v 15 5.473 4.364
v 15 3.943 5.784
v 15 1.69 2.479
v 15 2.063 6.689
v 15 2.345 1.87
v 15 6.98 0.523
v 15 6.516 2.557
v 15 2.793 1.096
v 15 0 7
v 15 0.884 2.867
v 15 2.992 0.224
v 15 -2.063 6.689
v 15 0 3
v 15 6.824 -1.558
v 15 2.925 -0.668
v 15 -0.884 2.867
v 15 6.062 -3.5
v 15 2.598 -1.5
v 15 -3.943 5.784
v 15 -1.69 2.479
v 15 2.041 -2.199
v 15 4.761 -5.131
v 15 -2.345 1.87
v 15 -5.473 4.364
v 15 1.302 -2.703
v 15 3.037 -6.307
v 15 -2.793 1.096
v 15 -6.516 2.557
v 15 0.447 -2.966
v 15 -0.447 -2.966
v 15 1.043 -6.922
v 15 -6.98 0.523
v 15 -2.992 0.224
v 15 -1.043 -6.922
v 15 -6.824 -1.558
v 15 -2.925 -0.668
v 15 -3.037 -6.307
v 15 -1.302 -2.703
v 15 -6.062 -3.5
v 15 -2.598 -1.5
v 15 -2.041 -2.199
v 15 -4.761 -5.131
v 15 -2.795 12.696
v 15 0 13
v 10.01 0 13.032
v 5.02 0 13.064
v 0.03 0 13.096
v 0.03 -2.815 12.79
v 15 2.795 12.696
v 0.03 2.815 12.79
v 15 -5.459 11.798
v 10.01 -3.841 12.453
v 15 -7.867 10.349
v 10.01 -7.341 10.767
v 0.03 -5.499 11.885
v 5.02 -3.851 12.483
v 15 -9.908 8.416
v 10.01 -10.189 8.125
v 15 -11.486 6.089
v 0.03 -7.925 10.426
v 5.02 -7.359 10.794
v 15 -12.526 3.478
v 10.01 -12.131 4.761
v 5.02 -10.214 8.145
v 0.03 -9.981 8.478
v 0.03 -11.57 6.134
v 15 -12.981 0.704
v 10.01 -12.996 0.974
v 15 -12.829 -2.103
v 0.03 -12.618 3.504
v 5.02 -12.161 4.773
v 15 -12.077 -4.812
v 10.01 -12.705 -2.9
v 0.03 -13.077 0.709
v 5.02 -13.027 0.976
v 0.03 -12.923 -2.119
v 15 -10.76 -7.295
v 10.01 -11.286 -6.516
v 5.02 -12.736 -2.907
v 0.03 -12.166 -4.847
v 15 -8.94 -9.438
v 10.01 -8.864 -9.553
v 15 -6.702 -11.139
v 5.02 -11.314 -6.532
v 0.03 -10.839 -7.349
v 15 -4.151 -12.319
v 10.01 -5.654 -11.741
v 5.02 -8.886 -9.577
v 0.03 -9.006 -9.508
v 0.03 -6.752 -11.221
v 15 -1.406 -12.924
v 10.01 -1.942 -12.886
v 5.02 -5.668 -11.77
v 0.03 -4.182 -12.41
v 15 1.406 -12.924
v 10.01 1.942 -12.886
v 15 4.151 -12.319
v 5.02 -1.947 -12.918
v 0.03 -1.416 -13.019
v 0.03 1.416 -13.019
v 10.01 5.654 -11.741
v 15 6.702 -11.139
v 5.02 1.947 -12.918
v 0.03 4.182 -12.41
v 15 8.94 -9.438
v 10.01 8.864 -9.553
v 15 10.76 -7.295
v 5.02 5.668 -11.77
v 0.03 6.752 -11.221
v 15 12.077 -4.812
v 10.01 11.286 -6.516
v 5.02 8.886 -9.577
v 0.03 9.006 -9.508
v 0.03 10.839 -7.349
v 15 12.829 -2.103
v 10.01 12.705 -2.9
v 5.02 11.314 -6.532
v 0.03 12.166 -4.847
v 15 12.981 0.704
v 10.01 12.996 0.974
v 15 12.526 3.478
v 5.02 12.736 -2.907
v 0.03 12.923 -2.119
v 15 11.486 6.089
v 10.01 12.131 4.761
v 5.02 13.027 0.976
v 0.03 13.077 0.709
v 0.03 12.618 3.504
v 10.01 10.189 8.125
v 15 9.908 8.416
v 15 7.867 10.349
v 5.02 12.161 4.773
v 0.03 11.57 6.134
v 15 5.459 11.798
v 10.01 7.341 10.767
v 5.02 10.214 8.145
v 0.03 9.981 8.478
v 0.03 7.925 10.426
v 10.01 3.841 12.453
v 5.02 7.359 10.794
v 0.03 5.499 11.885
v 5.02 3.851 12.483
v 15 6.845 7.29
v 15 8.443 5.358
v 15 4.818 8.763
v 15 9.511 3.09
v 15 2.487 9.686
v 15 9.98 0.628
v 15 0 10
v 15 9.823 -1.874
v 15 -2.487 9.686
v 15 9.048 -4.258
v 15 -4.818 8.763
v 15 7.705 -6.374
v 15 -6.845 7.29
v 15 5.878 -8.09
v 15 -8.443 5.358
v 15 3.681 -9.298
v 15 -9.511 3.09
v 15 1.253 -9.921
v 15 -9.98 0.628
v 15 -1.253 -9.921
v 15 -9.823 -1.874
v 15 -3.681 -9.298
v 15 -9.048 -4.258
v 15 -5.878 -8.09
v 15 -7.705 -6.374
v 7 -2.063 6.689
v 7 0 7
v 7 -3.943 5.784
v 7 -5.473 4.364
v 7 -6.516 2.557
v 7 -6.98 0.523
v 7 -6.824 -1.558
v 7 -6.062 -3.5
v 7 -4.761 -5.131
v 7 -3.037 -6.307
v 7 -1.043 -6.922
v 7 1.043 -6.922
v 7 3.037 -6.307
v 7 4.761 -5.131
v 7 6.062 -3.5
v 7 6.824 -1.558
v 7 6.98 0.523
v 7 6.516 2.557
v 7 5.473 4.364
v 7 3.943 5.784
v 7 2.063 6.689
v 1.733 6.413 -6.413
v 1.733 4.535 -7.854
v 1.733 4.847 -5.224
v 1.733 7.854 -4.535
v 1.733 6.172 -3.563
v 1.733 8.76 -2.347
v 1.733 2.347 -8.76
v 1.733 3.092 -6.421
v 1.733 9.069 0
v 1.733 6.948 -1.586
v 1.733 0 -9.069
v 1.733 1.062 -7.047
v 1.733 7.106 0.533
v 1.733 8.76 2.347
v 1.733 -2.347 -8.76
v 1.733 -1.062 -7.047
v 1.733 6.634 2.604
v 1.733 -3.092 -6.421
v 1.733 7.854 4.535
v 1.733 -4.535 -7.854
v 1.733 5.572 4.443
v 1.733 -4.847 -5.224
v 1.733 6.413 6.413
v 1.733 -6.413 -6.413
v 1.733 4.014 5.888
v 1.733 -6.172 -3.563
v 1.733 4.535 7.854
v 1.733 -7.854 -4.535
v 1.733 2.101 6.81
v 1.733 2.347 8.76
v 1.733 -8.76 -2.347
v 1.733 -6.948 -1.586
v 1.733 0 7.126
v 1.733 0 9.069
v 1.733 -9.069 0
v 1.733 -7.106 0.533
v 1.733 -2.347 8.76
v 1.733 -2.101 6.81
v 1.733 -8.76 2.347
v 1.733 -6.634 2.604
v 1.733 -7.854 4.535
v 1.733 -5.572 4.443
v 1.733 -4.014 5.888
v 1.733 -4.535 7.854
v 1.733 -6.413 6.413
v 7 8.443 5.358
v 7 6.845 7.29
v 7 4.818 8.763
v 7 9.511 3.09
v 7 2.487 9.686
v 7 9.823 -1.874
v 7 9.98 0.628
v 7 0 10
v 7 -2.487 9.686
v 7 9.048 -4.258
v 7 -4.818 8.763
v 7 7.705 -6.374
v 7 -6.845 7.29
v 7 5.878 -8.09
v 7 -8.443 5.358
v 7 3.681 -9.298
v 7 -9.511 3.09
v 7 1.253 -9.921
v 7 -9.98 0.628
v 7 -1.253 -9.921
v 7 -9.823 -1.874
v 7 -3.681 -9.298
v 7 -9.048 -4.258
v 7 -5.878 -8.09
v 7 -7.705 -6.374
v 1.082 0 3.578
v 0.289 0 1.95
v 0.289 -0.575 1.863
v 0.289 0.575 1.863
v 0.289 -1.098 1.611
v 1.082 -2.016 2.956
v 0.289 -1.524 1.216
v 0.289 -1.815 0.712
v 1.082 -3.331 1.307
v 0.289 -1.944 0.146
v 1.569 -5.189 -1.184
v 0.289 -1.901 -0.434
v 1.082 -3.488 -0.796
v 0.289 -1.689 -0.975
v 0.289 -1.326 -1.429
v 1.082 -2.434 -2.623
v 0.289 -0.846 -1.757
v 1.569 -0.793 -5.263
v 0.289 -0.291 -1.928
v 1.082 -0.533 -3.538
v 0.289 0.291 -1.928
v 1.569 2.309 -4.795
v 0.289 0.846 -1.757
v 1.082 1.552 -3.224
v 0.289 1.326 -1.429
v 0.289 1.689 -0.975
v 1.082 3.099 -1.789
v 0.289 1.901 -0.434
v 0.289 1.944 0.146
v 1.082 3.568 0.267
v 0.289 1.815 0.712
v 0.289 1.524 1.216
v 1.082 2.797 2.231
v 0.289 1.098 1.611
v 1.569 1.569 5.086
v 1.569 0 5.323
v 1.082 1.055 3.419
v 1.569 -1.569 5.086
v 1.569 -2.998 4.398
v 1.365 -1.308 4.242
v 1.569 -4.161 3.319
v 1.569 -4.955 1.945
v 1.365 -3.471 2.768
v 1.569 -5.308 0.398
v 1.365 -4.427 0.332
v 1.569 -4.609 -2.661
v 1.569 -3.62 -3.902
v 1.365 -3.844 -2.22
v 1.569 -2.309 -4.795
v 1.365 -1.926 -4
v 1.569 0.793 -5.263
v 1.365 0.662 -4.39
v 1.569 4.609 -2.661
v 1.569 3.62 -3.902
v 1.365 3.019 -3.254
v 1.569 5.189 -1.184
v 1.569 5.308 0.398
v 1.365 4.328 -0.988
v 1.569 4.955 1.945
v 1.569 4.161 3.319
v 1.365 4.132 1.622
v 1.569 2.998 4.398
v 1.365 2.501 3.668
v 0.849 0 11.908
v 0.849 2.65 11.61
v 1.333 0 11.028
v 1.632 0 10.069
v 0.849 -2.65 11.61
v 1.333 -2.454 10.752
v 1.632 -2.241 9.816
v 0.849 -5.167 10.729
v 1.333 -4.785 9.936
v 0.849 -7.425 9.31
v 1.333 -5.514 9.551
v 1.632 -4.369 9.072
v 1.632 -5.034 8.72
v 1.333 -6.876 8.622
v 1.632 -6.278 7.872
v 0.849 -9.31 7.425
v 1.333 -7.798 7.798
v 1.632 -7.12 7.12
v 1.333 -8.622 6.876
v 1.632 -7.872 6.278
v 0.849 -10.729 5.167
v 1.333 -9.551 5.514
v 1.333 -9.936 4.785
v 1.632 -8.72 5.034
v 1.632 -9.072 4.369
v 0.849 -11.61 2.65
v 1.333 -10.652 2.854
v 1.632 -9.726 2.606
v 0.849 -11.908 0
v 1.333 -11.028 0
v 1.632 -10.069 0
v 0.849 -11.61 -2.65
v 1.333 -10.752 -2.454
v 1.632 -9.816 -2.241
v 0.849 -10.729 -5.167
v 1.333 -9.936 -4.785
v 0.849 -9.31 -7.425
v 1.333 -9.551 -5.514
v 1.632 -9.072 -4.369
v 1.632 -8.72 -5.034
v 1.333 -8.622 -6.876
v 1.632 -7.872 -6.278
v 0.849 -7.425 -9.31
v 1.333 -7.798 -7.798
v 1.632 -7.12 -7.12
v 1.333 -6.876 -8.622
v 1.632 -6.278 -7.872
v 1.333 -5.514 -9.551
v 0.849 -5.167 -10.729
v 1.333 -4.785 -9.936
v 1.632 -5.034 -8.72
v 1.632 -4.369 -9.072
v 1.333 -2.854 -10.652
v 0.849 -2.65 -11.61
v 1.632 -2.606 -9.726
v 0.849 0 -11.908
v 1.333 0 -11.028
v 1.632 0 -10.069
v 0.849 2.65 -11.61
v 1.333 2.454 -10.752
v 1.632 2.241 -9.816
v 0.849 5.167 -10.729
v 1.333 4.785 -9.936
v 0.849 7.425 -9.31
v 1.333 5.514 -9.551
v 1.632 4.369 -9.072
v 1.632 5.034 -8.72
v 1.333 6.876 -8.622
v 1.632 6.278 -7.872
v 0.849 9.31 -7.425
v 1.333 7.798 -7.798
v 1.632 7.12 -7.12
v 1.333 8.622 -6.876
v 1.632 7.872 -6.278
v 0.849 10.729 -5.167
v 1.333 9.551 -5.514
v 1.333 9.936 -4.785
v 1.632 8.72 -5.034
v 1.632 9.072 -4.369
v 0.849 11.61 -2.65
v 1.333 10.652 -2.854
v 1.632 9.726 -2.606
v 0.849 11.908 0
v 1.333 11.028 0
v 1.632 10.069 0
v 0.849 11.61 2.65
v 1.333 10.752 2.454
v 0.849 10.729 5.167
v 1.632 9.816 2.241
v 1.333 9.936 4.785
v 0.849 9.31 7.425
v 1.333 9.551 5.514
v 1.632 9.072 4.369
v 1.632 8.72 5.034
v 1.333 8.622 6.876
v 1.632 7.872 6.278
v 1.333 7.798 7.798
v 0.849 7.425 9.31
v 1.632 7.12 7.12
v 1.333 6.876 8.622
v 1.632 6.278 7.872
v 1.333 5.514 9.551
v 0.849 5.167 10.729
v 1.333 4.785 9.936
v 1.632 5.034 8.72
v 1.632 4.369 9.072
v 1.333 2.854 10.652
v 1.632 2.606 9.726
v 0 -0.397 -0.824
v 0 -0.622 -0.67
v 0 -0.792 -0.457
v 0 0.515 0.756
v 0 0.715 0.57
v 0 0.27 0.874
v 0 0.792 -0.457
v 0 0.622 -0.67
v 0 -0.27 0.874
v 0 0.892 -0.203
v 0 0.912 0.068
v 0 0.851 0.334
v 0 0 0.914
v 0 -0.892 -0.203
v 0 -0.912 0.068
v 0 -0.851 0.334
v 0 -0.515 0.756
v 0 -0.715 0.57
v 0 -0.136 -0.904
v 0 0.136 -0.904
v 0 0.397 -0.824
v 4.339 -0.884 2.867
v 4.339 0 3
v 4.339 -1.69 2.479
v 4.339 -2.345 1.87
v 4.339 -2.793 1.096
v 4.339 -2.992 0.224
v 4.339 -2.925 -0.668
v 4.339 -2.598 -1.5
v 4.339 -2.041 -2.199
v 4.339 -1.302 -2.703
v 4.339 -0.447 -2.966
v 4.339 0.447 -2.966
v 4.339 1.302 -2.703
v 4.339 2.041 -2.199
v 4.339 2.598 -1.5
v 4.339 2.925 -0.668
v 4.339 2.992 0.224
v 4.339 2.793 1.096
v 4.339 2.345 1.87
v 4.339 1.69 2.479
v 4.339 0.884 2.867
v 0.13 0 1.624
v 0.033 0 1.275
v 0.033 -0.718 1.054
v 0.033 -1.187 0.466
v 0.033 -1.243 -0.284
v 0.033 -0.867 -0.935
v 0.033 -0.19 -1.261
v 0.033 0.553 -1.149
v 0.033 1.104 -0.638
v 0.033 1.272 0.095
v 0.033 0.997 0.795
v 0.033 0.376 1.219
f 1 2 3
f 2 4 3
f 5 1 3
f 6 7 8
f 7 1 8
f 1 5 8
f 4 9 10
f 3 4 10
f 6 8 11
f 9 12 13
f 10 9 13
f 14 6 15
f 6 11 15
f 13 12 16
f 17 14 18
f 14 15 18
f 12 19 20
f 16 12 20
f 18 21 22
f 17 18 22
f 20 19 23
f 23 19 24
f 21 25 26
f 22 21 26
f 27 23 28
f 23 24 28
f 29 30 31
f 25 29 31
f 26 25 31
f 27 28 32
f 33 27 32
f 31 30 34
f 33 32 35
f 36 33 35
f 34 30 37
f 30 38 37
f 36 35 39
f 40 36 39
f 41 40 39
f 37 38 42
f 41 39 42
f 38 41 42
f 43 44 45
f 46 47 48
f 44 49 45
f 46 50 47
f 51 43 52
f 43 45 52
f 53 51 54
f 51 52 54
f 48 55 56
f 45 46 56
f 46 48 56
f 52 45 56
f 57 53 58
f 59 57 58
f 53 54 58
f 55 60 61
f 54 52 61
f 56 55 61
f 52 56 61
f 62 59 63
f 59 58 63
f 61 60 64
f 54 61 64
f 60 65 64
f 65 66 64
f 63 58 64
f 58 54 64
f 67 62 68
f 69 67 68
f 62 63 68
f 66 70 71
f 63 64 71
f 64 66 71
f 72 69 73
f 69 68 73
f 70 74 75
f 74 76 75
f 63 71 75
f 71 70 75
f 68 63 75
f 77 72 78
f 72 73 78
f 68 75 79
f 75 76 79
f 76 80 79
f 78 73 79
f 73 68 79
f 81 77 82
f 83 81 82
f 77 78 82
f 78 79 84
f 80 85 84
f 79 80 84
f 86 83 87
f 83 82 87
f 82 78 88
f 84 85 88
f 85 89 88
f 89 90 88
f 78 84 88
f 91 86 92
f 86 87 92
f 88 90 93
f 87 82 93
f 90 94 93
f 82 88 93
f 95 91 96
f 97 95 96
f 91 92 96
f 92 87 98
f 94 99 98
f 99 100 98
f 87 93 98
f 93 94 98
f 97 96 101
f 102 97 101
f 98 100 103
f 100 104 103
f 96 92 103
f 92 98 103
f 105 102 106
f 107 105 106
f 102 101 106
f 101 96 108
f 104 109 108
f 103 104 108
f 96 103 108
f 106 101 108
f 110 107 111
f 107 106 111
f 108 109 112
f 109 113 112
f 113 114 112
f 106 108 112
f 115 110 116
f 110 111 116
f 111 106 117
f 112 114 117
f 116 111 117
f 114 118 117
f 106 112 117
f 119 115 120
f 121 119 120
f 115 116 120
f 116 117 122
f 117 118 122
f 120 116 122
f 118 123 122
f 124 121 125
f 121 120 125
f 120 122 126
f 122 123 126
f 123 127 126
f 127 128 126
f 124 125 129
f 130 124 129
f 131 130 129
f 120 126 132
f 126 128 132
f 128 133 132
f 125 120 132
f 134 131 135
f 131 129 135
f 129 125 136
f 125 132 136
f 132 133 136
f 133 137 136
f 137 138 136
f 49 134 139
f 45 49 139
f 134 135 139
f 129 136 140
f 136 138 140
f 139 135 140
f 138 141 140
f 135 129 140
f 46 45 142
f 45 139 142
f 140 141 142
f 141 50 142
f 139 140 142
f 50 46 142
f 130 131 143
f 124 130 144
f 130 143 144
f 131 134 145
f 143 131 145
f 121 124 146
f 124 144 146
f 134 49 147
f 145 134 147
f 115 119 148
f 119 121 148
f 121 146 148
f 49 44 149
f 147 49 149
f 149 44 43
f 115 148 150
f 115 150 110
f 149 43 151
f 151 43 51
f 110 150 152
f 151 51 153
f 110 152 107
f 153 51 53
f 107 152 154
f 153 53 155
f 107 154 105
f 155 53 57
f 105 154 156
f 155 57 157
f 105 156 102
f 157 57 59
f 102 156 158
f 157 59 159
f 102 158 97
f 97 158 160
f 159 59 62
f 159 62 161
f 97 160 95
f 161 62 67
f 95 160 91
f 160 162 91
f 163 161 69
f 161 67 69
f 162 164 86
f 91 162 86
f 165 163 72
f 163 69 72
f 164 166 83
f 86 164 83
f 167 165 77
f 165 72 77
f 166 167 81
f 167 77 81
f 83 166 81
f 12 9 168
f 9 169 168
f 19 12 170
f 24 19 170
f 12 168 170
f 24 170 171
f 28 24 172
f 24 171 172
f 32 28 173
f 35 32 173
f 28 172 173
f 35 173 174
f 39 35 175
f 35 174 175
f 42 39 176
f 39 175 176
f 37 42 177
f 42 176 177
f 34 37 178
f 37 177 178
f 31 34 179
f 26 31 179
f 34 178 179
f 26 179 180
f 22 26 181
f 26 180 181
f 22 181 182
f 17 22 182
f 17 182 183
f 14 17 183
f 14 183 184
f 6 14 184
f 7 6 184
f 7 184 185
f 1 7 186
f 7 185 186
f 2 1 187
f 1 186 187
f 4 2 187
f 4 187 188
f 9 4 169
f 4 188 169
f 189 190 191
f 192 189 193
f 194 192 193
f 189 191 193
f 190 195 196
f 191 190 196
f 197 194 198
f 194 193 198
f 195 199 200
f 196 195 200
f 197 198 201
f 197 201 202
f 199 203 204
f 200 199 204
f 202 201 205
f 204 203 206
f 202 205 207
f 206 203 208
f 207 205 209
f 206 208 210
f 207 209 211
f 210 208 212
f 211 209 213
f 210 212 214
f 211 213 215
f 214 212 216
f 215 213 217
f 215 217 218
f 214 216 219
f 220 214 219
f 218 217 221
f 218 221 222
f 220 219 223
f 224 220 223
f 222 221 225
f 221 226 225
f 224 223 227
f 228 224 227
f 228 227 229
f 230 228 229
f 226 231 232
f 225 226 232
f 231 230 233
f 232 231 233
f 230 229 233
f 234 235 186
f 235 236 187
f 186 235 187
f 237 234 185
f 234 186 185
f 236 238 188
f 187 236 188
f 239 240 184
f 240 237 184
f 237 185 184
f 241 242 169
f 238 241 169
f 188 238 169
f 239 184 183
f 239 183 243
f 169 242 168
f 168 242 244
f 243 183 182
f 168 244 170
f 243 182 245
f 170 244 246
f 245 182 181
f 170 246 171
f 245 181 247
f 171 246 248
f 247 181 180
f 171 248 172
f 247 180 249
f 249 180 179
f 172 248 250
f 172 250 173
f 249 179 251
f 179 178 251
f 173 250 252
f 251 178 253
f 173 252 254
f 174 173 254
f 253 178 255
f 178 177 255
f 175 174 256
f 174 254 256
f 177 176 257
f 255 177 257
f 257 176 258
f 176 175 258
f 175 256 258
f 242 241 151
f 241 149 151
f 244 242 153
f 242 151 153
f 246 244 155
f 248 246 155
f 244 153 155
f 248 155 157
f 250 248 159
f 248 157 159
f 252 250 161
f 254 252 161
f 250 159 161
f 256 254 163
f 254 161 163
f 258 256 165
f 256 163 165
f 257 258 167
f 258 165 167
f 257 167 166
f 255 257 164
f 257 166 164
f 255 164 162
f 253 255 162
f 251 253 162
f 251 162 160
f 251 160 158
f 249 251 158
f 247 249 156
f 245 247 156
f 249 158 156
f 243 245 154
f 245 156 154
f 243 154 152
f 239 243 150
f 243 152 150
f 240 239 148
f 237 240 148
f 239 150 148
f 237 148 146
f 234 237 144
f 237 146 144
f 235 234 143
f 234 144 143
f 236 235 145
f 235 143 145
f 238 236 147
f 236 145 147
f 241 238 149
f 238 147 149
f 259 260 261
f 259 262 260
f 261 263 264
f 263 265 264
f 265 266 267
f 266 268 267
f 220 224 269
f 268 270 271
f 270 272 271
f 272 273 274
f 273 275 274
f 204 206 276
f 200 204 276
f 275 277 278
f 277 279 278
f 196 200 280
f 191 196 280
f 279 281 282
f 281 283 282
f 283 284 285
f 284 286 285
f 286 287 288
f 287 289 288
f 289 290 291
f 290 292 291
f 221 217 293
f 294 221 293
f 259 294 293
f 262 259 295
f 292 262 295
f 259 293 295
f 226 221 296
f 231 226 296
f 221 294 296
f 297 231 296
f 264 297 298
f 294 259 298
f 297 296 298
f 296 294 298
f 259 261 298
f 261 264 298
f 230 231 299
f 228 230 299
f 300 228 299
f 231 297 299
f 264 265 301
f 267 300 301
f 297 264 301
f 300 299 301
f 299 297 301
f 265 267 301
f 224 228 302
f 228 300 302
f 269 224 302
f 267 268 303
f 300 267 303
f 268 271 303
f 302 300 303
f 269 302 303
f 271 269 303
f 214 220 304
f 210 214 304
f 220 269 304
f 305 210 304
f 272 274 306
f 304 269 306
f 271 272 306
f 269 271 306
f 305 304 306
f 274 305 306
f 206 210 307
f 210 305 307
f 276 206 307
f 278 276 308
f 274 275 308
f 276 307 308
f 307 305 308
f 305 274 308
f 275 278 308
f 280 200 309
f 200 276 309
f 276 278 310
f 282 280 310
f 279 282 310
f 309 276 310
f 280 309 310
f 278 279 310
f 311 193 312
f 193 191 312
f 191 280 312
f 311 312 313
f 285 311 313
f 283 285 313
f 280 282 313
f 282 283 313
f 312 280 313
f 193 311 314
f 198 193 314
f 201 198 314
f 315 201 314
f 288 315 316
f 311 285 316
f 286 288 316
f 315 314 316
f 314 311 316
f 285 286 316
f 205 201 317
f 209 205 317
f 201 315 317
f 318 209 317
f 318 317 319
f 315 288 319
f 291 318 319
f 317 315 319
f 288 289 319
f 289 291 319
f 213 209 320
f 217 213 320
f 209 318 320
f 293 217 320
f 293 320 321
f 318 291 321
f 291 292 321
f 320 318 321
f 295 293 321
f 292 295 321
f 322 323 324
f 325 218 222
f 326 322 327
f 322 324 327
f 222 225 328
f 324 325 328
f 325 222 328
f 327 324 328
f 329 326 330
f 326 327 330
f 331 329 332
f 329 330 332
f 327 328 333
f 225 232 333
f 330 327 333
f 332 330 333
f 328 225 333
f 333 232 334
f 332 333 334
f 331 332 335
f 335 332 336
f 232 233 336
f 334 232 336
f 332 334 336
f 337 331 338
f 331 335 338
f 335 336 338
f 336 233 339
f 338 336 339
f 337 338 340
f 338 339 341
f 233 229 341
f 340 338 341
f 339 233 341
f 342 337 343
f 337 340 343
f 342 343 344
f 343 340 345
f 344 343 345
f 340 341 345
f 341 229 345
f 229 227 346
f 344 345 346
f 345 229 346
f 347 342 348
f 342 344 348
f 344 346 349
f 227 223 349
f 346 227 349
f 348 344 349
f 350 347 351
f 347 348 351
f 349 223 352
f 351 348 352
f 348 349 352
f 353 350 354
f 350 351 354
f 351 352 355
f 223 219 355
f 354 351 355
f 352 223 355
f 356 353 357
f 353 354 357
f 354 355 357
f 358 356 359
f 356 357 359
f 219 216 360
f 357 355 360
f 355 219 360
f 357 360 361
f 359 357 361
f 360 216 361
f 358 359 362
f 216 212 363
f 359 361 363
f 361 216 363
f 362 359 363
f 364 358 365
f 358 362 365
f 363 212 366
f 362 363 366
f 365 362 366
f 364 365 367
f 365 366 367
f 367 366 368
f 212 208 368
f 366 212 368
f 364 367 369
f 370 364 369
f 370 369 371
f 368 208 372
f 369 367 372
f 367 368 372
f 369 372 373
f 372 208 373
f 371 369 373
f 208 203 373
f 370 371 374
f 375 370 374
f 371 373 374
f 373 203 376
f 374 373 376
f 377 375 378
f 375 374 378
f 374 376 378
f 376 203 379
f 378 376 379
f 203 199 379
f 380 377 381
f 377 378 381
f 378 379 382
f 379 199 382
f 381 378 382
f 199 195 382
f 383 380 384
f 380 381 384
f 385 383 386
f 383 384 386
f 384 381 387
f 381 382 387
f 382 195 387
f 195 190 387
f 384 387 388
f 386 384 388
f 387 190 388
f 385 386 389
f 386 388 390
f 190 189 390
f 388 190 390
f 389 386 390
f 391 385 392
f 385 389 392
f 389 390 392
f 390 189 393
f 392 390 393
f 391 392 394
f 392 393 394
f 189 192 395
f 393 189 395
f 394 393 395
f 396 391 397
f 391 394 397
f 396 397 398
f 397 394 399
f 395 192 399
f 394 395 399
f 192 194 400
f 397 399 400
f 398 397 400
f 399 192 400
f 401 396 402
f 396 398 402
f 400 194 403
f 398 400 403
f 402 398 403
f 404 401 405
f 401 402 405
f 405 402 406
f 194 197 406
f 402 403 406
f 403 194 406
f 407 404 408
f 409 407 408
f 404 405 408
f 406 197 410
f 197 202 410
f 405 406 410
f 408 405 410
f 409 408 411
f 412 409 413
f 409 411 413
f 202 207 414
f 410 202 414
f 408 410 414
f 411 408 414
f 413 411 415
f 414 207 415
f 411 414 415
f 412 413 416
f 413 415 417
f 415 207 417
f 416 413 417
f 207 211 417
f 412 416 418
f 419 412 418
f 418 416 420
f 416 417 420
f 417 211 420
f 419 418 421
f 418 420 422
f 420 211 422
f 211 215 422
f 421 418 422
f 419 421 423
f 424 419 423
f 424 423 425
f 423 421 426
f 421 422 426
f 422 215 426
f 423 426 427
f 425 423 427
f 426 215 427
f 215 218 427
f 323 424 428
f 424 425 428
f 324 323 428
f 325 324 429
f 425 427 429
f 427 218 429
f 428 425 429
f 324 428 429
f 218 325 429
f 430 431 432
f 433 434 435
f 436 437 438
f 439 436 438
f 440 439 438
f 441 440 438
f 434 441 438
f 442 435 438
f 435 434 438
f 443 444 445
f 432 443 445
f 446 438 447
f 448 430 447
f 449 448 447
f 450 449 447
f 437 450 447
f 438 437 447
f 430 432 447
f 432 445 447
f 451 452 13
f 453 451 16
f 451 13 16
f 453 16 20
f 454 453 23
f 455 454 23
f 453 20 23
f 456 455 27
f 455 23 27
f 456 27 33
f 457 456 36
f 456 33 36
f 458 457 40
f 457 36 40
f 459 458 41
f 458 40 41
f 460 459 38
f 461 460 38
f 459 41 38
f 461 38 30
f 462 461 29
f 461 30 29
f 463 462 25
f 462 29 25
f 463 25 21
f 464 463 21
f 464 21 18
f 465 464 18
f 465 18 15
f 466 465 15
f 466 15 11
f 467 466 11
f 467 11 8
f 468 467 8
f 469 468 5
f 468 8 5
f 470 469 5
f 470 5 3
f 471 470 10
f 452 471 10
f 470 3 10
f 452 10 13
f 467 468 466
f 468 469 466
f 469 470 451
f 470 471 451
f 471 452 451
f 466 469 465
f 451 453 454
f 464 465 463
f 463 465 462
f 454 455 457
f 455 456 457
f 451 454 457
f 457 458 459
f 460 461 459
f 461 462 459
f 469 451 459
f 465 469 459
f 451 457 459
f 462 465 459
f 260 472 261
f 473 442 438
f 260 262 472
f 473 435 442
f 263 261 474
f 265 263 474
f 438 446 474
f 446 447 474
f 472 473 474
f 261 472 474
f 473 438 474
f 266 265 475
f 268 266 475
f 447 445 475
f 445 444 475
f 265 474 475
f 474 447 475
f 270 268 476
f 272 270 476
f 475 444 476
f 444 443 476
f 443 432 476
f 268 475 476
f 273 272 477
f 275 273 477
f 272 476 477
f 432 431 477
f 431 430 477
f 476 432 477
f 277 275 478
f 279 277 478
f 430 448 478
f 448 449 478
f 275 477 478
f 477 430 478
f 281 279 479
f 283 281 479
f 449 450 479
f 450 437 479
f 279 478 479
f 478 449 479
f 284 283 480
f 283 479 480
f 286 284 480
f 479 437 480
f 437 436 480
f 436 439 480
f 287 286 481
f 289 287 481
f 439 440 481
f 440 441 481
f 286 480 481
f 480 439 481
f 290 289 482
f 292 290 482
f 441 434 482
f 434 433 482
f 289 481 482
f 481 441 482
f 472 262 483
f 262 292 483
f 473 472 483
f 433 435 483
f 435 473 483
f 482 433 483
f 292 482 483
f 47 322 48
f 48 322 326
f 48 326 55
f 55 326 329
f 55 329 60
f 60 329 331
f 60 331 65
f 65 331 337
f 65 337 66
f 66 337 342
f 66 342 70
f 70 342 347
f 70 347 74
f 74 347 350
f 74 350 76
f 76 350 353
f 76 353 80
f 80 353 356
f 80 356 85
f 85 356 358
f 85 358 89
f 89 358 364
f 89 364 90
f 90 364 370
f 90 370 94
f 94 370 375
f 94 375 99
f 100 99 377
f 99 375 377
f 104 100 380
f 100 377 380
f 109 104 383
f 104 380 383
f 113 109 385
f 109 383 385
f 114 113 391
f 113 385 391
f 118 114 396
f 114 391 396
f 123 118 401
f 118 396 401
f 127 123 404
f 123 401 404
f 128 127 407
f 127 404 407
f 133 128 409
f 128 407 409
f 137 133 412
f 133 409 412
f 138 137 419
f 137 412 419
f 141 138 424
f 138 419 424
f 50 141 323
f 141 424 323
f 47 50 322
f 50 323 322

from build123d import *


with BuildPart() as f1:
    # F0 (on Front) → F1 (revolve)
    with BuildSketch(Plane.XZ):
        with BuildLine():
            Line((4.338621, 3), (15, 3))
            Line((15, 3), (15, 7))
            Line((15, 7), (7, 7))
            Line((7, 7), (7, 10))
            Line((7, 10), (15, 10))
            Line((15, 10), (15, 13))
            Line((15, 13), (0.029517, 13.095834))
            Line((0.029517, 13.095834), (0.848745, 11.908195))
            ThreePointArc((0.848745, 11.908195), (1.506784, 10.555919), (1.732951, 9.069139))
            Line((1.732951, 9.069139), (1.732951, 7.126357))
            ThreePointArc((1.732951, 7.126357), (1.365156, 4.439235), (0.288825, 1.949774))
            ThreePointArc((0.288825, 1.949774), (0.073559, 1.451882), (0, 0.914457))
            Line((0, 0.914457), (0, 0))
            Line((0, 0), (4.338621, 0))
            Line((4.338621, 0), (4.338621, 3))
        make_face()
    revolve(axis=Axis((8.018091, 0, 0), (1, 0, 0)))


solid = f1.part
